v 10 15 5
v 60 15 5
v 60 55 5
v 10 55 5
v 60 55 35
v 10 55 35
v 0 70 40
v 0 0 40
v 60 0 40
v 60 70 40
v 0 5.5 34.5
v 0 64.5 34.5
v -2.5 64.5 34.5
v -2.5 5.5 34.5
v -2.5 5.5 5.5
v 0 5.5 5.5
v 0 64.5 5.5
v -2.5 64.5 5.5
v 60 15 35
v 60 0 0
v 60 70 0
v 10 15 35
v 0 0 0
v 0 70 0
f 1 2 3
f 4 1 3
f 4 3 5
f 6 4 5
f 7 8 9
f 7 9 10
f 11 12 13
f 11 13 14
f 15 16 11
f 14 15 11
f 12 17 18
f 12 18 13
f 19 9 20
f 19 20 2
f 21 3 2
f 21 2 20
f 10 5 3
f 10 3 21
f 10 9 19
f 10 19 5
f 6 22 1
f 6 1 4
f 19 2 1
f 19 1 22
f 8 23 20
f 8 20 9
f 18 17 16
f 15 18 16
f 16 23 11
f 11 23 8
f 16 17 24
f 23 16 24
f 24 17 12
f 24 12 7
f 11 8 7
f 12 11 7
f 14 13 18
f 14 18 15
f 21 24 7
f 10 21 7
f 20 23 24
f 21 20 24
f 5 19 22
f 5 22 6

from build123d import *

# Parameters (mm, degrees)
F0_W     = 70
F0_H     = 40
F1_DEPTH = 60
F2_W     = 40
F2_H     = 30
F3_DEPTH = 50
F4_W     = 59
F4_H     = 29
F5_DEPTH = 2.5


with BuildPart() as f1:
    # F0 (on Right) → F1 (new body)
    with BuildSketch(Plane.YZ):
        with Locations((35, 20)):
            Rectangle(F0_W, F0_H)
    extrude(amount=F1_DEPTH)

    # F2 (on face) → F3 (cut)
    with BuildSketch(Plane.YZ.offset(60)):
        with Locations((35, 20)):
            Rectangle(F2_W, F2_H)
    extrude(amount=-F3_DEPTH, mode=Mode.SUBTRACT)

    # F4 (on face) → F5 (join)
    with BuildSketch(Plane(origin=(0, 0, 0), x_dir=(0, -1, 0), z_dir=(-1, 0, 0))):
        with Locations((-35, 20)):
            Rectangle(F4_W, F4_H)
    extrude(amount=F5_DEPTH)


solid = f1.part
